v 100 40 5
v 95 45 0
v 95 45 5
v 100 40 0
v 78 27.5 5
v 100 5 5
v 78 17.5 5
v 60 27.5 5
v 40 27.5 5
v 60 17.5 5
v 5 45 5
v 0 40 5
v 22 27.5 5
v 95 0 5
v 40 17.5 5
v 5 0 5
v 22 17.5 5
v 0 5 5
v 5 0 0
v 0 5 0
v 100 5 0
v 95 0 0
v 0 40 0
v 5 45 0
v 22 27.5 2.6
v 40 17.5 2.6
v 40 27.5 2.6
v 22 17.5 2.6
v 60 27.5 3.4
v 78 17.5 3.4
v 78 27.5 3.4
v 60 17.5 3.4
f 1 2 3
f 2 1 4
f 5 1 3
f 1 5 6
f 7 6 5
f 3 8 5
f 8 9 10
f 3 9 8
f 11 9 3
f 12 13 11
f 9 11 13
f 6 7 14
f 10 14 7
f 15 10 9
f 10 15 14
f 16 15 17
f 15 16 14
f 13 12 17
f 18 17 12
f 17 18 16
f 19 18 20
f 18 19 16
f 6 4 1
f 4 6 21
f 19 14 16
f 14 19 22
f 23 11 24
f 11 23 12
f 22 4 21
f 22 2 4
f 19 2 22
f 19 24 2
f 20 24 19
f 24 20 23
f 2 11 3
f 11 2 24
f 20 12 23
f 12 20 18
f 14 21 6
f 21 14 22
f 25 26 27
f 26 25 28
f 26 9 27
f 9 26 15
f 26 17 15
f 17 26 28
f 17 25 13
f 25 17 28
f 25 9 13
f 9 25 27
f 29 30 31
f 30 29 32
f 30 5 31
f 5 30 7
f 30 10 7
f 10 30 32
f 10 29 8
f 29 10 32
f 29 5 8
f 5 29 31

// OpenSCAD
$fn = 32;

// ----------------------------------------------------------------------
// Windowed plate: 2 voids, 100 x 45 x 5 mm
// ----------------------------------------------------------------------

// --- parameters (mm) ---
plate_l = 100;            // plate length, X
plate_w = 45;             // plate width, Y
plate_t = 5;              // plate thickness, Z
edge_margin = 12;         // wall from the plate edge to any window
windows = 2;              // number of windows in the row
win_l = 18;               // window length
win_w = 10;               // window width
win_pitch = 38;           // window pitch along X
depth_1 = 2.4;            // depth of void 1 (full thickness = through)
depth_2 = 1.6;            // depth of void 2 (full thickness = through)
corner_c = 5;             // corner chamfer of the plate

profile = [[5, 0], [95, 0], [100, 5], [100, 40], [95, 45], [5, 45], [0, 40], [0, 5]];  // primary outline, 8 points, counter clockwise
void_1 = [[22, 17.5], [40, 17.5], [40, 27.5], [22, 27.5]];  // window 1 of the row, 4 points
void_2 = [[60, 17.5], [78, 17.5], [78, 27.5], [60, 27.5]];  // window 2 of the row, 4 points

// --- the one profile operation ---
difference() {
  linear_extrude(height = plate_t) polygon(points = profile);
  translate([0, 0, plate_t - depth_1])
    linear_extrude(height = depth_1 + 1) polygon(points = void_1);
  translate([0, 0, plate_t - depth_2])
    linear_extrude(height = depth_2 + 1) polygon(points = void_2);
}
